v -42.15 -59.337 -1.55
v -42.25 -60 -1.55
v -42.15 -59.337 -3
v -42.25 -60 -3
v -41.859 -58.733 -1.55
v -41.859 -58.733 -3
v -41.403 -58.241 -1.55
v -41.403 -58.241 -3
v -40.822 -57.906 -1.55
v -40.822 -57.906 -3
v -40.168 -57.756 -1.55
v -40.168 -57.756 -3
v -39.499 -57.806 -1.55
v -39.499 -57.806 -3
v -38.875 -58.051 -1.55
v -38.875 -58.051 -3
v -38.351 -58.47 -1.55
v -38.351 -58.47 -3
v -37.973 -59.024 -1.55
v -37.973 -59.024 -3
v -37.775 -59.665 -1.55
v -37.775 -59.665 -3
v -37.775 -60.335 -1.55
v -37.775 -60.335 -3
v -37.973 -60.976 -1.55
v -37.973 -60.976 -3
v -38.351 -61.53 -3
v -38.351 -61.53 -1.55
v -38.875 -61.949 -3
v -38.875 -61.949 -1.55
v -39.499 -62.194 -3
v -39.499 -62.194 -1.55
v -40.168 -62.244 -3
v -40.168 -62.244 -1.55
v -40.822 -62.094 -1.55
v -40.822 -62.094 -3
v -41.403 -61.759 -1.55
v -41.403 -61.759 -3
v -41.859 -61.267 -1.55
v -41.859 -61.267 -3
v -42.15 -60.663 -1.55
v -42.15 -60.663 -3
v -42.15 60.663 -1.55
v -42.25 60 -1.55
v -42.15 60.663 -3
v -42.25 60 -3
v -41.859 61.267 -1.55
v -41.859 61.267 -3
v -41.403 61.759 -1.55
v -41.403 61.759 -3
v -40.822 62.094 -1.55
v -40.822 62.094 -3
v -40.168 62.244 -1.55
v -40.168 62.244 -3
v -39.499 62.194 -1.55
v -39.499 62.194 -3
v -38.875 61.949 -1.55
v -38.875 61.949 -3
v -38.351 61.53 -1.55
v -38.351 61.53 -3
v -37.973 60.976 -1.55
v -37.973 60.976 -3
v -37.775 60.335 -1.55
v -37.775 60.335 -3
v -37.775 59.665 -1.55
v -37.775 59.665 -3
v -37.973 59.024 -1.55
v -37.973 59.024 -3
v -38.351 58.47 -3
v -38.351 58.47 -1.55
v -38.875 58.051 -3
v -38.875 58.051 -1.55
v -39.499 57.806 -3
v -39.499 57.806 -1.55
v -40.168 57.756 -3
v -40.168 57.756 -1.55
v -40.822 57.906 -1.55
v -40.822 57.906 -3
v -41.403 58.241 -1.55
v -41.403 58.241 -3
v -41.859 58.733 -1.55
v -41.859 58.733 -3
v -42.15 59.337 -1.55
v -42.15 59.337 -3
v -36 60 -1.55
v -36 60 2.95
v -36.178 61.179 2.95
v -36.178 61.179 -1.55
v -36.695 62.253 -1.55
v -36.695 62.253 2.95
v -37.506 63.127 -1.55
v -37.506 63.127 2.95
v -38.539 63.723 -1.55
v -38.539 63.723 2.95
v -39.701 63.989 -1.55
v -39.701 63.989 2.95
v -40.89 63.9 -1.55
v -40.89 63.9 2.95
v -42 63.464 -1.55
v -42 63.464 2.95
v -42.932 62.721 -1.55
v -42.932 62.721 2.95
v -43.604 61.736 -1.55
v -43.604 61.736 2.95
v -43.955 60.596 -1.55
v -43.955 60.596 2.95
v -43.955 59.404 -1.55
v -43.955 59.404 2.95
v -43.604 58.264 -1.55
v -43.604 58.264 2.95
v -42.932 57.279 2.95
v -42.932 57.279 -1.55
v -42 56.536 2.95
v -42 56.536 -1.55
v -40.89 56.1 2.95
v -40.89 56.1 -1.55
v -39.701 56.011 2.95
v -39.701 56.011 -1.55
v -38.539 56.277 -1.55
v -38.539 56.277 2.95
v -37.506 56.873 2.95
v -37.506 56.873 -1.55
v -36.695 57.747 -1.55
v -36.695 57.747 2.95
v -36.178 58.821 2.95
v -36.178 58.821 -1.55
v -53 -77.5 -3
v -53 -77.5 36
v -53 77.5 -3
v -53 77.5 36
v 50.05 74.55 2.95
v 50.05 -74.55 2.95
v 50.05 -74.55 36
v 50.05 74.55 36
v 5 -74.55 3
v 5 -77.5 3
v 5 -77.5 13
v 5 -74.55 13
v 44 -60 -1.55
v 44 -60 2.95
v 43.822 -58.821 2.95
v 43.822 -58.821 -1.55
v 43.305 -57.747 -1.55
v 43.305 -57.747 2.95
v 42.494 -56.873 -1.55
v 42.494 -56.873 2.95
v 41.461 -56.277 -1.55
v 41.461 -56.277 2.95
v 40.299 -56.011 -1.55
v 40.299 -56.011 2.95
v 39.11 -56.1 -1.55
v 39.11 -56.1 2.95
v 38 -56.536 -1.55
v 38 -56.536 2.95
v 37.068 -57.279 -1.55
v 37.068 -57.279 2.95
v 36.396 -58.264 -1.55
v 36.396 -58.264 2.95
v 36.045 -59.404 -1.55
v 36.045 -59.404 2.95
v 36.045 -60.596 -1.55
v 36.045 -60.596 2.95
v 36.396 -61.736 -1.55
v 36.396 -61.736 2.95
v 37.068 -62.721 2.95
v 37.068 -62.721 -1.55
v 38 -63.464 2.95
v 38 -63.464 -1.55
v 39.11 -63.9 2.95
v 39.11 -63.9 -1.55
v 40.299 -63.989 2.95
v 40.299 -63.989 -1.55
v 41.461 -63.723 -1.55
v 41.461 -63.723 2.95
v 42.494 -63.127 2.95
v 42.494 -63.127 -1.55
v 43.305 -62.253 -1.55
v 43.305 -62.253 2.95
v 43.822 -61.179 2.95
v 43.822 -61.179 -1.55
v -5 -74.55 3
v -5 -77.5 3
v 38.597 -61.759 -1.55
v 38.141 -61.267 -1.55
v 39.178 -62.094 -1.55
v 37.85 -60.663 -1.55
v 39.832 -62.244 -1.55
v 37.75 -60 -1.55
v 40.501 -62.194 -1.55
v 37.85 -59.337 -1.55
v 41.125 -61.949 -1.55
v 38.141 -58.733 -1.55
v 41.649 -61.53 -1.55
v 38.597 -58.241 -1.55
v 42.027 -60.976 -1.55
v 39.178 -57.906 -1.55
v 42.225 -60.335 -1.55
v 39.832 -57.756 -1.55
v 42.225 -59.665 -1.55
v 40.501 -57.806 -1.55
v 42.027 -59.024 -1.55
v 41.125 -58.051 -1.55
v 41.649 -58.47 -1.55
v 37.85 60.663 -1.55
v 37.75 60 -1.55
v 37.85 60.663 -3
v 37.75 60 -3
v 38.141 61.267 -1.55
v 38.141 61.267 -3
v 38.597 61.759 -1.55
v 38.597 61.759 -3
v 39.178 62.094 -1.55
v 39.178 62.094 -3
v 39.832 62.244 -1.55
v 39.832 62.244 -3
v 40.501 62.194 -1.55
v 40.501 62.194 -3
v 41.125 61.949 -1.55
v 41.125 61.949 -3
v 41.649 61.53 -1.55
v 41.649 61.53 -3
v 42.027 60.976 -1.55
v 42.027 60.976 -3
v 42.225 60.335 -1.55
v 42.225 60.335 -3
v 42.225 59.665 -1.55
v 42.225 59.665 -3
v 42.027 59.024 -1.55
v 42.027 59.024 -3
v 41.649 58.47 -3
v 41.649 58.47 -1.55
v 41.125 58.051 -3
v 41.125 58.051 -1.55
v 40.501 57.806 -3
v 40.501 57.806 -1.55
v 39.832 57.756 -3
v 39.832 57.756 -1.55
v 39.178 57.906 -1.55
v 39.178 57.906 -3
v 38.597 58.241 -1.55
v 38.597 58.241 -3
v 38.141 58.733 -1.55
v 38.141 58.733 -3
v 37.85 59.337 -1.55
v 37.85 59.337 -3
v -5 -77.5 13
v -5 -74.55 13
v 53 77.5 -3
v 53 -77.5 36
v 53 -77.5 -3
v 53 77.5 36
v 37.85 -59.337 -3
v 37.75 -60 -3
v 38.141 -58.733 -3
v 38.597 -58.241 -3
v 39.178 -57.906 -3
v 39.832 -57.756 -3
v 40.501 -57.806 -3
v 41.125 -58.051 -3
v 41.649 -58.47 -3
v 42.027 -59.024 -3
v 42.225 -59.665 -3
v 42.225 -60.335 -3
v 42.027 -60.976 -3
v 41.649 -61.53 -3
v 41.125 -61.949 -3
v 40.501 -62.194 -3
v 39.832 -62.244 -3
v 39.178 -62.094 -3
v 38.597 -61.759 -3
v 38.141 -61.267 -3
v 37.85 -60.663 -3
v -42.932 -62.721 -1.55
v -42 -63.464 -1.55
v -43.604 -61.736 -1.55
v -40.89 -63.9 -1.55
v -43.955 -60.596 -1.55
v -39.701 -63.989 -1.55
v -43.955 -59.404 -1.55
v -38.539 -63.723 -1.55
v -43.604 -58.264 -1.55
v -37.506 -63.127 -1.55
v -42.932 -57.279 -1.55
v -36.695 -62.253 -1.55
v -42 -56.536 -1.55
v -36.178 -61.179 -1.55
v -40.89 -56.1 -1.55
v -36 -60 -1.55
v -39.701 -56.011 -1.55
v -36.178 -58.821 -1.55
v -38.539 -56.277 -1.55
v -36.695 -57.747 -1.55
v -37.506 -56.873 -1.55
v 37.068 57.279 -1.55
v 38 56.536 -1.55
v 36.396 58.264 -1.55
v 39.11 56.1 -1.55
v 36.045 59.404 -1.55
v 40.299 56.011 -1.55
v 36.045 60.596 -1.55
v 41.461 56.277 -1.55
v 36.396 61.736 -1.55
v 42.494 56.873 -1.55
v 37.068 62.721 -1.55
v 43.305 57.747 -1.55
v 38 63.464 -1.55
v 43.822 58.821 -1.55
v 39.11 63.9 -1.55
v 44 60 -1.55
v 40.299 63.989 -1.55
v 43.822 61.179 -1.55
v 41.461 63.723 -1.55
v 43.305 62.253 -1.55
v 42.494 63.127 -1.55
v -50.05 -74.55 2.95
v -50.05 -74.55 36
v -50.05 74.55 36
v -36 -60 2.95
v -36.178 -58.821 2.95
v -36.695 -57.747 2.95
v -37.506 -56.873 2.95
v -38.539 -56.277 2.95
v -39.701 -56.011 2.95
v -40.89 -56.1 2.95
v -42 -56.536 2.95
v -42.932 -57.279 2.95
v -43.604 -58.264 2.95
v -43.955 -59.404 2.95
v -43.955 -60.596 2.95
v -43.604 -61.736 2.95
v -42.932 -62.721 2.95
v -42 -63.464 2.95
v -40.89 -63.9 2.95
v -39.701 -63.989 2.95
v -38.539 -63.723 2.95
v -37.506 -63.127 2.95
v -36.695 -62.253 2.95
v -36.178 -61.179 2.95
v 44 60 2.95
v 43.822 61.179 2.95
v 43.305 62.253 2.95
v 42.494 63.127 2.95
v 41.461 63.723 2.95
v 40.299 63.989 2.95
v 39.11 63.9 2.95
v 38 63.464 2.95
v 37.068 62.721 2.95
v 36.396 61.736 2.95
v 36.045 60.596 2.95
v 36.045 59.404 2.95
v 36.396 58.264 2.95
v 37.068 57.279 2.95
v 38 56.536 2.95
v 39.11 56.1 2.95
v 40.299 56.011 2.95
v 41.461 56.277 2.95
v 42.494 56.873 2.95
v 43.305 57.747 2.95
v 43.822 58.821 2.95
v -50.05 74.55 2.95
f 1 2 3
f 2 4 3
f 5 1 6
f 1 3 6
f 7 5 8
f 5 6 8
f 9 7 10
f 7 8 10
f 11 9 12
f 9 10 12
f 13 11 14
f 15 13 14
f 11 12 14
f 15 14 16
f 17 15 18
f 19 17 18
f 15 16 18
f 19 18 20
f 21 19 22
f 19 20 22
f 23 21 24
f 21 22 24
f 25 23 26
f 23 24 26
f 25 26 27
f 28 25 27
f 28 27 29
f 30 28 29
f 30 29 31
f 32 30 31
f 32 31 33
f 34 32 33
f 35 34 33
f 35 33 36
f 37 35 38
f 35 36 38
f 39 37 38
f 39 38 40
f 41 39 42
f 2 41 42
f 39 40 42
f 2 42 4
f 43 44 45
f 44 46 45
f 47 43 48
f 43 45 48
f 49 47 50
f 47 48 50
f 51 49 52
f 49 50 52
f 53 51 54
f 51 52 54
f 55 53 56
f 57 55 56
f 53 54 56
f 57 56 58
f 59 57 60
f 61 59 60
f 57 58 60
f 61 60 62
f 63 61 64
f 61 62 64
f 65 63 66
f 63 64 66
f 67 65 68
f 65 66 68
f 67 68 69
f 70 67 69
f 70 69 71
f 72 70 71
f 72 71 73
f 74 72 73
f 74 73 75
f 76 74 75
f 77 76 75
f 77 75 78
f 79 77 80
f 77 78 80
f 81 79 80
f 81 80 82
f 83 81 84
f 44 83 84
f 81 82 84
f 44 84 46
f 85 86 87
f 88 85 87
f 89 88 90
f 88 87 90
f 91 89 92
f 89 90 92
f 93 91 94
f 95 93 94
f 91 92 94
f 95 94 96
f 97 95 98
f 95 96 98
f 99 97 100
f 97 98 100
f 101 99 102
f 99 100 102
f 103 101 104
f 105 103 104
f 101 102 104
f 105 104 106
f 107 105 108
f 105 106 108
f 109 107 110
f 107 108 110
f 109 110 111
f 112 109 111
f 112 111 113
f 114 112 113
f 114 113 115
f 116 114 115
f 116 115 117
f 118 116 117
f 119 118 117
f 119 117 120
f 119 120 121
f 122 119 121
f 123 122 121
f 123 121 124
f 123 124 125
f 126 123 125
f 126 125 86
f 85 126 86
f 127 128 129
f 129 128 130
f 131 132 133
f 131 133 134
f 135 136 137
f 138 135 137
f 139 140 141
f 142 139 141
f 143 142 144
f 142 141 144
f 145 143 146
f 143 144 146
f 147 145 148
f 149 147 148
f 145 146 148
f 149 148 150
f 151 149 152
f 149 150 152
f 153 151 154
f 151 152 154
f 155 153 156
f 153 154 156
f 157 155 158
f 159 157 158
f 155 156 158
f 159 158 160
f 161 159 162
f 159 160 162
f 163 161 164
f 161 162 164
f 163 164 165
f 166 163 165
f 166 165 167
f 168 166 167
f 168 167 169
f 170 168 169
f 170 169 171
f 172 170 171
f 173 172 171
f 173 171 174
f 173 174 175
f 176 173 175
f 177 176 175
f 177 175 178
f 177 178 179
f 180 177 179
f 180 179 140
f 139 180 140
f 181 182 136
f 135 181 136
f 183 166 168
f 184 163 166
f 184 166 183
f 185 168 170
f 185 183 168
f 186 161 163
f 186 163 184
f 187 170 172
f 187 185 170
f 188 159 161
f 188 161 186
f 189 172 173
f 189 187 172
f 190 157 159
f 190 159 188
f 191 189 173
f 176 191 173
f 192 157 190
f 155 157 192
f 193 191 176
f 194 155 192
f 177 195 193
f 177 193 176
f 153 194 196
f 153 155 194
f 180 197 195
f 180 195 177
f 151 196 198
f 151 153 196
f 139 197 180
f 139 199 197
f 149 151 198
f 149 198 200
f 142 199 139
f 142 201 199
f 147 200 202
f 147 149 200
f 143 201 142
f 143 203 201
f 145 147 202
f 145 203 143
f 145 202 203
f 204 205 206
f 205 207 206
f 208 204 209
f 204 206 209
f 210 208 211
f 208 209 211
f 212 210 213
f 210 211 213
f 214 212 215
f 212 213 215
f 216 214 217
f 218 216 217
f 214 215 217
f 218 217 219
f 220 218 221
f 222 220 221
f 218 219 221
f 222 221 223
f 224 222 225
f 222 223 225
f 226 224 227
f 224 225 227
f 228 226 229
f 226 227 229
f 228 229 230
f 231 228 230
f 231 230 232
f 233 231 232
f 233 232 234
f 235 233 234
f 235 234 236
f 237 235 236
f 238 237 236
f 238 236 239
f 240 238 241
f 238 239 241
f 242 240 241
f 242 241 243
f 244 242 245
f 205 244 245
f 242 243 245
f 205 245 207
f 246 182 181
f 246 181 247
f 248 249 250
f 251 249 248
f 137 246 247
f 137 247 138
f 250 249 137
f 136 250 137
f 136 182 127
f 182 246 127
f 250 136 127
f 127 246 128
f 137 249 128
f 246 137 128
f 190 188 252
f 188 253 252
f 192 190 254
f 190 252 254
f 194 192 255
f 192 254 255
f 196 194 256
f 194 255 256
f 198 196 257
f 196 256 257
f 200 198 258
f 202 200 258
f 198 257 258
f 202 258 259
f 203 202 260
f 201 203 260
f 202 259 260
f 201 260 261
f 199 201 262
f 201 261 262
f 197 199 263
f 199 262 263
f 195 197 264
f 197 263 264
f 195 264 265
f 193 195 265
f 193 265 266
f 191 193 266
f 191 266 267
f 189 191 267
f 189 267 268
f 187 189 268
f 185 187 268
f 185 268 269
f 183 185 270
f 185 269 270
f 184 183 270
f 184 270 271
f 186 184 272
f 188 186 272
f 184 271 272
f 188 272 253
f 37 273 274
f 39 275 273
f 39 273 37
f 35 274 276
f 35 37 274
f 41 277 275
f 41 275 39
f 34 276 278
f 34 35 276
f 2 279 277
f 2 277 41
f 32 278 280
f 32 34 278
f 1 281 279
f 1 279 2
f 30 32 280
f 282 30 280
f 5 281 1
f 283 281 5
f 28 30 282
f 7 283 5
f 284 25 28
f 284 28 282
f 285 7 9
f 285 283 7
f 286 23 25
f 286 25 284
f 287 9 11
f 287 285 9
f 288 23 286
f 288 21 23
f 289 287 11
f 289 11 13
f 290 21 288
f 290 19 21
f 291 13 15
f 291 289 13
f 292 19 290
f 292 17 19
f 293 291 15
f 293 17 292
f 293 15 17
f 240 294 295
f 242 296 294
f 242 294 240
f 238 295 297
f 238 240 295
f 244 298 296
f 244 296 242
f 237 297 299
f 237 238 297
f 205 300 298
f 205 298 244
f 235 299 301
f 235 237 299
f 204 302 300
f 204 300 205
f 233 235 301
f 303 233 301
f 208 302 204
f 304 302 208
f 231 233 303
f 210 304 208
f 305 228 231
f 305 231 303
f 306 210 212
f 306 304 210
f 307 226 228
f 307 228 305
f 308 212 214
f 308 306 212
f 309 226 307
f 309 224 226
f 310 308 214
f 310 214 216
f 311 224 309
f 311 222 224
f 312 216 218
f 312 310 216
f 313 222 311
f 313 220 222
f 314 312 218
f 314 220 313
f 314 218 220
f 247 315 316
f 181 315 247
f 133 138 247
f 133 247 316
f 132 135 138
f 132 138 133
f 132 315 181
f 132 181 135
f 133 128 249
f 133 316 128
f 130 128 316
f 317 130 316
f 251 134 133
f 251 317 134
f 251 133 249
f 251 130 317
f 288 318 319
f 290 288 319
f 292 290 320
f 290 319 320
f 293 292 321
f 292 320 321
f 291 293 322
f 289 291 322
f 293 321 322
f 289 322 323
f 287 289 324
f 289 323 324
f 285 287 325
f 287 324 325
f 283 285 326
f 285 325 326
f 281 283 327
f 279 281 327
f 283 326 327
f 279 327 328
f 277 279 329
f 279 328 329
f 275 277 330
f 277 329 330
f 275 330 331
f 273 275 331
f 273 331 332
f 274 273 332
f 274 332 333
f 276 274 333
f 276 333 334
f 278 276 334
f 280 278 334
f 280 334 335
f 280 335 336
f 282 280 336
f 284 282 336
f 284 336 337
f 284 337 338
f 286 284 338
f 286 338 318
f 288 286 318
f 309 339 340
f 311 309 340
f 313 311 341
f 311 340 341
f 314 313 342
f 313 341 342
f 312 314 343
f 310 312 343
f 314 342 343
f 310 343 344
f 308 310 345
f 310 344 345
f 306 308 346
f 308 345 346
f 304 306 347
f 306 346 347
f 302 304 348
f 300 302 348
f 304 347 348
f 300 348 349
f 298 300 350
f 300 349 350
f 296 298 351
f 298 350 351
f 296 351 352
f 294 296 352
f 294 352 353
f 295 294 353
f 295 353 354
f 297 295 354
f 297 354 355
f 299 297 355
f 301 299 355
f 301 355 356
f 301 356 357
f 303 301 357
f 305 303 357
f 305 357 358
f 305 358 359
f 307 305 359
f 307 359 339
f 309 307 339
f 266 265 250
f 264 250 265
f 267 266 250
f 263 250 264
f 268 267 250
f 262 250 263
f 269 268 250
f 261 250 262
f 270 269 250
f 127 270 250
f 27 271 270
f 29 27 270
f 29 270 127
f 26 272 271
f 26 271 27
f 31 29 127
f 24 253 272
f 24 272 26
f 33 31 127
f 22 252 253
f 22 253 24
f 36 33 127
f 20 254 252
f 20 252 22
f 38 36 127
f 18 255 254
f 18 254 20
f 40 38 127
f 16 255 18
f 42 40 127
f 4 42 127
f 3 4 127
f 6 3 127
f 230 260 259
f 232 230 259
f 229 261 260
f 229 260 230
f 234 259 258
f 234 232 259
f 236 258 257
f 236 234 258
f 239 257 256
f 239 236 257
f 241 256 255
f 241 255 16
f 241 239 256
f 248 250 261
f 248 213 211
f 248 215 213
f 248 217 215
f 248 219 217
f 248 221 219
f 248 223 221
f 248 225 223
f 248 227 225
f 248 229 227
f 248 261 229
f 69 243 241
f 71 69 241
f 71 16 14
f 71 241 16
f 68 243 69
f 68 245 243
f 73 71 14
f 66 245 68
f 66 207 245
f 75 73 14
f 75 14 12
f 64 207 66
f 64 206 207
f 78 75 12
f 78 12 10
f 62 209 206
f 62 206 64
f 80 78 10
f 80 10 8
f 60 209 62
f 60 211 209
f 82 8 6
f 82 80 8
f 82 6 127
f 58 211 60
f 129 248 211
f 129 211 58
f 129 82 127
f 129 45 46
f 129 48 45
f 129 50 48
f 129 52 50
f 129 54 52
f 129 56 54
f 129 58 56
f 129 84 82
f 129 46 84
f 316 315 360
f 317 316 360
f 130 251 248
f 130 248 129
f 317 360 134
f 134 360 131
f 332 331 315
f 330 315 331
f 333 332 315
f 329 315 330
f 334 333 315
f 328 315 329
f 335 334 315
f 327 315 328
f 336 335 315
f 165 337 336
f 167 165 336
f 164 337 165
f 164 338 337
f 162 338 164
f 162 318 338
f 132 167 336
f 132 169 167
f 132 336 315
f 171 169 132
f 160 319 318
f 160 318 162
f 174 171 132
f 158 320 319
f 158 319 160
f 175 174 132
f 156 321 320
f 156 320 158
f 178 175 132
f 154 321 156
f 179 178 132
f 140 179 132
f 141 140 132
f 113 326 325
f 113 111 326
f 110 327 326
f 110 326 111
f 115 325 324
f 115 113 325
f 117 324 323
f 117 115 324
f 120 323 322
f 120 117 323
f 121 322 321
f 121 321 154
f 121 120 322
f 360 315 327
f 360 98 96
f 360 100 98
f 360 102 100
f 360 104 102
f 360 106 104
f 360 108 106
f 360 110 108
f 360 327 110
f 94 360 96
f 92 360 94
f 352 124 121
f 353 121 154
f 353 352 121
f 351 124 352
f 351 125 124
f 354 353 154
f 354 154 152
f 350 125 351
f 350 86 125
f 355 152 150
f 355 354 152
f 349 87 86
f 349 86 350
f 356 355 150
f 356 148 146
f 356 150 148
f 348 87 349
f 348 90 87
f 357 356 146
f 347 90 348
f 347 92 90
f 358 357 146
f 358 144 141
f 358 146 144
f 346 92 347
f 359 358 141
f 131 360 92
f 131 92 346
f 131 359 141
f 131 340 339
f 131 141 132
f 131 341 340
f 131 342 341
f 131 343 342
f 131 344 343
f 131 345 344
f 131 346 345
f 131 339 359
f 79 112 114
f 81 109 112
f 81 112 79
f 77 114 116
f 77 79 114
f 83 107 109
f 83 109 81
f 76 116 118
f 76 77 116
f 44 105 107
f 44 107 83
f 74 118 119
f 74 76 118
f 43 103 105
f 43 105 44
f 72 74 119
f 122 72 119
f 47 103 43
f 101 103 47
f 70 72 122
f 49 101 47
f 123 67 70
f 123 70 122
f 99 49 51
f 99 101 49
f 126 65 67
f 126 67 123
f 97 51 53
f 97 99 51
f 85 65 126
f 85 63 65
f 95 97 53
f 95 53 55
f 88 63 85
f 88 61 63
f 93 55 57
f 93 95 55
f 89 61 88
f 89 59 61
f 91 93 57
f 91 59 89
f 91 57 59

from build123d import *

# Parameters (mm, degrees)
SKETCH_1_W                   = 106
SKETCH_1_H                   = 155
EXTRUDE_1_DEPTH              = 36
SHELL_1_T                    = -2.95
SKETCH_2_W                   = 10
SKETCH_2_H                   = 10
CUT_EXTRUDE_1_DEPTH          = 36
SKETCH_3_W                   = 106
SKETCH_3_H                   = 155
EXTRUDE_2_DEPTH              = 3
HOLE_WIZARD_M4_1_D           = 4.5
HOLE_WIZARD_M4_1_DEPTH       = 45
HOLE_WIZARD_M4_1_CBORE_D     = 8
HOLE_WIZARD_M4_1_CBORE_DEPTH = 4.5
HOLE_WIZARD_M4_1_TIP         = 1.351936393


with BuildPart() as part:
    # 스케치1 → 보스-돌출1 (new body)
    with BuildSketch(Plane.XY):
        Rectangle(SKETCH_1_W, SKETCH_1_H)
    extrude(amount=EXTRUDE_1_DEPTH)

    # 쉘1
    shell_1_openings = [part.faces().sort_by_distance(p)[0] for p in [
        (0, 0, 36),
    ]]
    offset(amount=SHELL_1_T, openings=shell_1_openings, kind=Kind.INTERSECTION)

    # 스케치2 → 컷-돌출1 (cut)
    with BuildSketch(Plane.XZ.offset(77.5)):
        with Locations((0, 8)):
            Rectangle(SKETCH_2_W, SKETCH_2_H)
    extrude(amount=-CUT_EXTRUDE_1_DEPTH, mode=Mode.SUBTRACT)

    # 스케치3 → 보스-돌출2 (add)
    with BuildSketch(Plane(origin=(0, 0, 0), x_dir=(-1, 0, 0), z_dir=(0, 0, -1))):
        Rectangle(SKETCH_3_W, SKETCH_3_H)
    extrude(amount=EXTRUDE_2_DEPTH)

    # M4 소켓 머리 캡 나사용 카운터보어1
    with Locations(Plane.XY.offset(2.95)):
        with Locations((-40, 60), (40, 60), (40, -60), (-40, -60)):
            CounterBoreHole(HOLE_WIZARD_M4_1_D / 2, HOLE_WIZARD_M4_1_CBORE_D / 2, HOLE_WIZARD_M4_1_CBORE_DEPTH, depth=HOLE_WIZARD_M4_1_DEPTH)
            with Locations((0, 0, -(HOLE_WIZARD_M4_1_DEPTH + HOLE_WIZARD_M4_1_TIP / 2))):  # 118° drill point
                Cone(0, HOLE_WIZARD_M4_1_D / 2, HOLE_WIZARD_M4_1_TIP, mode=Mode.SUBTRACT)


solid = part.part
